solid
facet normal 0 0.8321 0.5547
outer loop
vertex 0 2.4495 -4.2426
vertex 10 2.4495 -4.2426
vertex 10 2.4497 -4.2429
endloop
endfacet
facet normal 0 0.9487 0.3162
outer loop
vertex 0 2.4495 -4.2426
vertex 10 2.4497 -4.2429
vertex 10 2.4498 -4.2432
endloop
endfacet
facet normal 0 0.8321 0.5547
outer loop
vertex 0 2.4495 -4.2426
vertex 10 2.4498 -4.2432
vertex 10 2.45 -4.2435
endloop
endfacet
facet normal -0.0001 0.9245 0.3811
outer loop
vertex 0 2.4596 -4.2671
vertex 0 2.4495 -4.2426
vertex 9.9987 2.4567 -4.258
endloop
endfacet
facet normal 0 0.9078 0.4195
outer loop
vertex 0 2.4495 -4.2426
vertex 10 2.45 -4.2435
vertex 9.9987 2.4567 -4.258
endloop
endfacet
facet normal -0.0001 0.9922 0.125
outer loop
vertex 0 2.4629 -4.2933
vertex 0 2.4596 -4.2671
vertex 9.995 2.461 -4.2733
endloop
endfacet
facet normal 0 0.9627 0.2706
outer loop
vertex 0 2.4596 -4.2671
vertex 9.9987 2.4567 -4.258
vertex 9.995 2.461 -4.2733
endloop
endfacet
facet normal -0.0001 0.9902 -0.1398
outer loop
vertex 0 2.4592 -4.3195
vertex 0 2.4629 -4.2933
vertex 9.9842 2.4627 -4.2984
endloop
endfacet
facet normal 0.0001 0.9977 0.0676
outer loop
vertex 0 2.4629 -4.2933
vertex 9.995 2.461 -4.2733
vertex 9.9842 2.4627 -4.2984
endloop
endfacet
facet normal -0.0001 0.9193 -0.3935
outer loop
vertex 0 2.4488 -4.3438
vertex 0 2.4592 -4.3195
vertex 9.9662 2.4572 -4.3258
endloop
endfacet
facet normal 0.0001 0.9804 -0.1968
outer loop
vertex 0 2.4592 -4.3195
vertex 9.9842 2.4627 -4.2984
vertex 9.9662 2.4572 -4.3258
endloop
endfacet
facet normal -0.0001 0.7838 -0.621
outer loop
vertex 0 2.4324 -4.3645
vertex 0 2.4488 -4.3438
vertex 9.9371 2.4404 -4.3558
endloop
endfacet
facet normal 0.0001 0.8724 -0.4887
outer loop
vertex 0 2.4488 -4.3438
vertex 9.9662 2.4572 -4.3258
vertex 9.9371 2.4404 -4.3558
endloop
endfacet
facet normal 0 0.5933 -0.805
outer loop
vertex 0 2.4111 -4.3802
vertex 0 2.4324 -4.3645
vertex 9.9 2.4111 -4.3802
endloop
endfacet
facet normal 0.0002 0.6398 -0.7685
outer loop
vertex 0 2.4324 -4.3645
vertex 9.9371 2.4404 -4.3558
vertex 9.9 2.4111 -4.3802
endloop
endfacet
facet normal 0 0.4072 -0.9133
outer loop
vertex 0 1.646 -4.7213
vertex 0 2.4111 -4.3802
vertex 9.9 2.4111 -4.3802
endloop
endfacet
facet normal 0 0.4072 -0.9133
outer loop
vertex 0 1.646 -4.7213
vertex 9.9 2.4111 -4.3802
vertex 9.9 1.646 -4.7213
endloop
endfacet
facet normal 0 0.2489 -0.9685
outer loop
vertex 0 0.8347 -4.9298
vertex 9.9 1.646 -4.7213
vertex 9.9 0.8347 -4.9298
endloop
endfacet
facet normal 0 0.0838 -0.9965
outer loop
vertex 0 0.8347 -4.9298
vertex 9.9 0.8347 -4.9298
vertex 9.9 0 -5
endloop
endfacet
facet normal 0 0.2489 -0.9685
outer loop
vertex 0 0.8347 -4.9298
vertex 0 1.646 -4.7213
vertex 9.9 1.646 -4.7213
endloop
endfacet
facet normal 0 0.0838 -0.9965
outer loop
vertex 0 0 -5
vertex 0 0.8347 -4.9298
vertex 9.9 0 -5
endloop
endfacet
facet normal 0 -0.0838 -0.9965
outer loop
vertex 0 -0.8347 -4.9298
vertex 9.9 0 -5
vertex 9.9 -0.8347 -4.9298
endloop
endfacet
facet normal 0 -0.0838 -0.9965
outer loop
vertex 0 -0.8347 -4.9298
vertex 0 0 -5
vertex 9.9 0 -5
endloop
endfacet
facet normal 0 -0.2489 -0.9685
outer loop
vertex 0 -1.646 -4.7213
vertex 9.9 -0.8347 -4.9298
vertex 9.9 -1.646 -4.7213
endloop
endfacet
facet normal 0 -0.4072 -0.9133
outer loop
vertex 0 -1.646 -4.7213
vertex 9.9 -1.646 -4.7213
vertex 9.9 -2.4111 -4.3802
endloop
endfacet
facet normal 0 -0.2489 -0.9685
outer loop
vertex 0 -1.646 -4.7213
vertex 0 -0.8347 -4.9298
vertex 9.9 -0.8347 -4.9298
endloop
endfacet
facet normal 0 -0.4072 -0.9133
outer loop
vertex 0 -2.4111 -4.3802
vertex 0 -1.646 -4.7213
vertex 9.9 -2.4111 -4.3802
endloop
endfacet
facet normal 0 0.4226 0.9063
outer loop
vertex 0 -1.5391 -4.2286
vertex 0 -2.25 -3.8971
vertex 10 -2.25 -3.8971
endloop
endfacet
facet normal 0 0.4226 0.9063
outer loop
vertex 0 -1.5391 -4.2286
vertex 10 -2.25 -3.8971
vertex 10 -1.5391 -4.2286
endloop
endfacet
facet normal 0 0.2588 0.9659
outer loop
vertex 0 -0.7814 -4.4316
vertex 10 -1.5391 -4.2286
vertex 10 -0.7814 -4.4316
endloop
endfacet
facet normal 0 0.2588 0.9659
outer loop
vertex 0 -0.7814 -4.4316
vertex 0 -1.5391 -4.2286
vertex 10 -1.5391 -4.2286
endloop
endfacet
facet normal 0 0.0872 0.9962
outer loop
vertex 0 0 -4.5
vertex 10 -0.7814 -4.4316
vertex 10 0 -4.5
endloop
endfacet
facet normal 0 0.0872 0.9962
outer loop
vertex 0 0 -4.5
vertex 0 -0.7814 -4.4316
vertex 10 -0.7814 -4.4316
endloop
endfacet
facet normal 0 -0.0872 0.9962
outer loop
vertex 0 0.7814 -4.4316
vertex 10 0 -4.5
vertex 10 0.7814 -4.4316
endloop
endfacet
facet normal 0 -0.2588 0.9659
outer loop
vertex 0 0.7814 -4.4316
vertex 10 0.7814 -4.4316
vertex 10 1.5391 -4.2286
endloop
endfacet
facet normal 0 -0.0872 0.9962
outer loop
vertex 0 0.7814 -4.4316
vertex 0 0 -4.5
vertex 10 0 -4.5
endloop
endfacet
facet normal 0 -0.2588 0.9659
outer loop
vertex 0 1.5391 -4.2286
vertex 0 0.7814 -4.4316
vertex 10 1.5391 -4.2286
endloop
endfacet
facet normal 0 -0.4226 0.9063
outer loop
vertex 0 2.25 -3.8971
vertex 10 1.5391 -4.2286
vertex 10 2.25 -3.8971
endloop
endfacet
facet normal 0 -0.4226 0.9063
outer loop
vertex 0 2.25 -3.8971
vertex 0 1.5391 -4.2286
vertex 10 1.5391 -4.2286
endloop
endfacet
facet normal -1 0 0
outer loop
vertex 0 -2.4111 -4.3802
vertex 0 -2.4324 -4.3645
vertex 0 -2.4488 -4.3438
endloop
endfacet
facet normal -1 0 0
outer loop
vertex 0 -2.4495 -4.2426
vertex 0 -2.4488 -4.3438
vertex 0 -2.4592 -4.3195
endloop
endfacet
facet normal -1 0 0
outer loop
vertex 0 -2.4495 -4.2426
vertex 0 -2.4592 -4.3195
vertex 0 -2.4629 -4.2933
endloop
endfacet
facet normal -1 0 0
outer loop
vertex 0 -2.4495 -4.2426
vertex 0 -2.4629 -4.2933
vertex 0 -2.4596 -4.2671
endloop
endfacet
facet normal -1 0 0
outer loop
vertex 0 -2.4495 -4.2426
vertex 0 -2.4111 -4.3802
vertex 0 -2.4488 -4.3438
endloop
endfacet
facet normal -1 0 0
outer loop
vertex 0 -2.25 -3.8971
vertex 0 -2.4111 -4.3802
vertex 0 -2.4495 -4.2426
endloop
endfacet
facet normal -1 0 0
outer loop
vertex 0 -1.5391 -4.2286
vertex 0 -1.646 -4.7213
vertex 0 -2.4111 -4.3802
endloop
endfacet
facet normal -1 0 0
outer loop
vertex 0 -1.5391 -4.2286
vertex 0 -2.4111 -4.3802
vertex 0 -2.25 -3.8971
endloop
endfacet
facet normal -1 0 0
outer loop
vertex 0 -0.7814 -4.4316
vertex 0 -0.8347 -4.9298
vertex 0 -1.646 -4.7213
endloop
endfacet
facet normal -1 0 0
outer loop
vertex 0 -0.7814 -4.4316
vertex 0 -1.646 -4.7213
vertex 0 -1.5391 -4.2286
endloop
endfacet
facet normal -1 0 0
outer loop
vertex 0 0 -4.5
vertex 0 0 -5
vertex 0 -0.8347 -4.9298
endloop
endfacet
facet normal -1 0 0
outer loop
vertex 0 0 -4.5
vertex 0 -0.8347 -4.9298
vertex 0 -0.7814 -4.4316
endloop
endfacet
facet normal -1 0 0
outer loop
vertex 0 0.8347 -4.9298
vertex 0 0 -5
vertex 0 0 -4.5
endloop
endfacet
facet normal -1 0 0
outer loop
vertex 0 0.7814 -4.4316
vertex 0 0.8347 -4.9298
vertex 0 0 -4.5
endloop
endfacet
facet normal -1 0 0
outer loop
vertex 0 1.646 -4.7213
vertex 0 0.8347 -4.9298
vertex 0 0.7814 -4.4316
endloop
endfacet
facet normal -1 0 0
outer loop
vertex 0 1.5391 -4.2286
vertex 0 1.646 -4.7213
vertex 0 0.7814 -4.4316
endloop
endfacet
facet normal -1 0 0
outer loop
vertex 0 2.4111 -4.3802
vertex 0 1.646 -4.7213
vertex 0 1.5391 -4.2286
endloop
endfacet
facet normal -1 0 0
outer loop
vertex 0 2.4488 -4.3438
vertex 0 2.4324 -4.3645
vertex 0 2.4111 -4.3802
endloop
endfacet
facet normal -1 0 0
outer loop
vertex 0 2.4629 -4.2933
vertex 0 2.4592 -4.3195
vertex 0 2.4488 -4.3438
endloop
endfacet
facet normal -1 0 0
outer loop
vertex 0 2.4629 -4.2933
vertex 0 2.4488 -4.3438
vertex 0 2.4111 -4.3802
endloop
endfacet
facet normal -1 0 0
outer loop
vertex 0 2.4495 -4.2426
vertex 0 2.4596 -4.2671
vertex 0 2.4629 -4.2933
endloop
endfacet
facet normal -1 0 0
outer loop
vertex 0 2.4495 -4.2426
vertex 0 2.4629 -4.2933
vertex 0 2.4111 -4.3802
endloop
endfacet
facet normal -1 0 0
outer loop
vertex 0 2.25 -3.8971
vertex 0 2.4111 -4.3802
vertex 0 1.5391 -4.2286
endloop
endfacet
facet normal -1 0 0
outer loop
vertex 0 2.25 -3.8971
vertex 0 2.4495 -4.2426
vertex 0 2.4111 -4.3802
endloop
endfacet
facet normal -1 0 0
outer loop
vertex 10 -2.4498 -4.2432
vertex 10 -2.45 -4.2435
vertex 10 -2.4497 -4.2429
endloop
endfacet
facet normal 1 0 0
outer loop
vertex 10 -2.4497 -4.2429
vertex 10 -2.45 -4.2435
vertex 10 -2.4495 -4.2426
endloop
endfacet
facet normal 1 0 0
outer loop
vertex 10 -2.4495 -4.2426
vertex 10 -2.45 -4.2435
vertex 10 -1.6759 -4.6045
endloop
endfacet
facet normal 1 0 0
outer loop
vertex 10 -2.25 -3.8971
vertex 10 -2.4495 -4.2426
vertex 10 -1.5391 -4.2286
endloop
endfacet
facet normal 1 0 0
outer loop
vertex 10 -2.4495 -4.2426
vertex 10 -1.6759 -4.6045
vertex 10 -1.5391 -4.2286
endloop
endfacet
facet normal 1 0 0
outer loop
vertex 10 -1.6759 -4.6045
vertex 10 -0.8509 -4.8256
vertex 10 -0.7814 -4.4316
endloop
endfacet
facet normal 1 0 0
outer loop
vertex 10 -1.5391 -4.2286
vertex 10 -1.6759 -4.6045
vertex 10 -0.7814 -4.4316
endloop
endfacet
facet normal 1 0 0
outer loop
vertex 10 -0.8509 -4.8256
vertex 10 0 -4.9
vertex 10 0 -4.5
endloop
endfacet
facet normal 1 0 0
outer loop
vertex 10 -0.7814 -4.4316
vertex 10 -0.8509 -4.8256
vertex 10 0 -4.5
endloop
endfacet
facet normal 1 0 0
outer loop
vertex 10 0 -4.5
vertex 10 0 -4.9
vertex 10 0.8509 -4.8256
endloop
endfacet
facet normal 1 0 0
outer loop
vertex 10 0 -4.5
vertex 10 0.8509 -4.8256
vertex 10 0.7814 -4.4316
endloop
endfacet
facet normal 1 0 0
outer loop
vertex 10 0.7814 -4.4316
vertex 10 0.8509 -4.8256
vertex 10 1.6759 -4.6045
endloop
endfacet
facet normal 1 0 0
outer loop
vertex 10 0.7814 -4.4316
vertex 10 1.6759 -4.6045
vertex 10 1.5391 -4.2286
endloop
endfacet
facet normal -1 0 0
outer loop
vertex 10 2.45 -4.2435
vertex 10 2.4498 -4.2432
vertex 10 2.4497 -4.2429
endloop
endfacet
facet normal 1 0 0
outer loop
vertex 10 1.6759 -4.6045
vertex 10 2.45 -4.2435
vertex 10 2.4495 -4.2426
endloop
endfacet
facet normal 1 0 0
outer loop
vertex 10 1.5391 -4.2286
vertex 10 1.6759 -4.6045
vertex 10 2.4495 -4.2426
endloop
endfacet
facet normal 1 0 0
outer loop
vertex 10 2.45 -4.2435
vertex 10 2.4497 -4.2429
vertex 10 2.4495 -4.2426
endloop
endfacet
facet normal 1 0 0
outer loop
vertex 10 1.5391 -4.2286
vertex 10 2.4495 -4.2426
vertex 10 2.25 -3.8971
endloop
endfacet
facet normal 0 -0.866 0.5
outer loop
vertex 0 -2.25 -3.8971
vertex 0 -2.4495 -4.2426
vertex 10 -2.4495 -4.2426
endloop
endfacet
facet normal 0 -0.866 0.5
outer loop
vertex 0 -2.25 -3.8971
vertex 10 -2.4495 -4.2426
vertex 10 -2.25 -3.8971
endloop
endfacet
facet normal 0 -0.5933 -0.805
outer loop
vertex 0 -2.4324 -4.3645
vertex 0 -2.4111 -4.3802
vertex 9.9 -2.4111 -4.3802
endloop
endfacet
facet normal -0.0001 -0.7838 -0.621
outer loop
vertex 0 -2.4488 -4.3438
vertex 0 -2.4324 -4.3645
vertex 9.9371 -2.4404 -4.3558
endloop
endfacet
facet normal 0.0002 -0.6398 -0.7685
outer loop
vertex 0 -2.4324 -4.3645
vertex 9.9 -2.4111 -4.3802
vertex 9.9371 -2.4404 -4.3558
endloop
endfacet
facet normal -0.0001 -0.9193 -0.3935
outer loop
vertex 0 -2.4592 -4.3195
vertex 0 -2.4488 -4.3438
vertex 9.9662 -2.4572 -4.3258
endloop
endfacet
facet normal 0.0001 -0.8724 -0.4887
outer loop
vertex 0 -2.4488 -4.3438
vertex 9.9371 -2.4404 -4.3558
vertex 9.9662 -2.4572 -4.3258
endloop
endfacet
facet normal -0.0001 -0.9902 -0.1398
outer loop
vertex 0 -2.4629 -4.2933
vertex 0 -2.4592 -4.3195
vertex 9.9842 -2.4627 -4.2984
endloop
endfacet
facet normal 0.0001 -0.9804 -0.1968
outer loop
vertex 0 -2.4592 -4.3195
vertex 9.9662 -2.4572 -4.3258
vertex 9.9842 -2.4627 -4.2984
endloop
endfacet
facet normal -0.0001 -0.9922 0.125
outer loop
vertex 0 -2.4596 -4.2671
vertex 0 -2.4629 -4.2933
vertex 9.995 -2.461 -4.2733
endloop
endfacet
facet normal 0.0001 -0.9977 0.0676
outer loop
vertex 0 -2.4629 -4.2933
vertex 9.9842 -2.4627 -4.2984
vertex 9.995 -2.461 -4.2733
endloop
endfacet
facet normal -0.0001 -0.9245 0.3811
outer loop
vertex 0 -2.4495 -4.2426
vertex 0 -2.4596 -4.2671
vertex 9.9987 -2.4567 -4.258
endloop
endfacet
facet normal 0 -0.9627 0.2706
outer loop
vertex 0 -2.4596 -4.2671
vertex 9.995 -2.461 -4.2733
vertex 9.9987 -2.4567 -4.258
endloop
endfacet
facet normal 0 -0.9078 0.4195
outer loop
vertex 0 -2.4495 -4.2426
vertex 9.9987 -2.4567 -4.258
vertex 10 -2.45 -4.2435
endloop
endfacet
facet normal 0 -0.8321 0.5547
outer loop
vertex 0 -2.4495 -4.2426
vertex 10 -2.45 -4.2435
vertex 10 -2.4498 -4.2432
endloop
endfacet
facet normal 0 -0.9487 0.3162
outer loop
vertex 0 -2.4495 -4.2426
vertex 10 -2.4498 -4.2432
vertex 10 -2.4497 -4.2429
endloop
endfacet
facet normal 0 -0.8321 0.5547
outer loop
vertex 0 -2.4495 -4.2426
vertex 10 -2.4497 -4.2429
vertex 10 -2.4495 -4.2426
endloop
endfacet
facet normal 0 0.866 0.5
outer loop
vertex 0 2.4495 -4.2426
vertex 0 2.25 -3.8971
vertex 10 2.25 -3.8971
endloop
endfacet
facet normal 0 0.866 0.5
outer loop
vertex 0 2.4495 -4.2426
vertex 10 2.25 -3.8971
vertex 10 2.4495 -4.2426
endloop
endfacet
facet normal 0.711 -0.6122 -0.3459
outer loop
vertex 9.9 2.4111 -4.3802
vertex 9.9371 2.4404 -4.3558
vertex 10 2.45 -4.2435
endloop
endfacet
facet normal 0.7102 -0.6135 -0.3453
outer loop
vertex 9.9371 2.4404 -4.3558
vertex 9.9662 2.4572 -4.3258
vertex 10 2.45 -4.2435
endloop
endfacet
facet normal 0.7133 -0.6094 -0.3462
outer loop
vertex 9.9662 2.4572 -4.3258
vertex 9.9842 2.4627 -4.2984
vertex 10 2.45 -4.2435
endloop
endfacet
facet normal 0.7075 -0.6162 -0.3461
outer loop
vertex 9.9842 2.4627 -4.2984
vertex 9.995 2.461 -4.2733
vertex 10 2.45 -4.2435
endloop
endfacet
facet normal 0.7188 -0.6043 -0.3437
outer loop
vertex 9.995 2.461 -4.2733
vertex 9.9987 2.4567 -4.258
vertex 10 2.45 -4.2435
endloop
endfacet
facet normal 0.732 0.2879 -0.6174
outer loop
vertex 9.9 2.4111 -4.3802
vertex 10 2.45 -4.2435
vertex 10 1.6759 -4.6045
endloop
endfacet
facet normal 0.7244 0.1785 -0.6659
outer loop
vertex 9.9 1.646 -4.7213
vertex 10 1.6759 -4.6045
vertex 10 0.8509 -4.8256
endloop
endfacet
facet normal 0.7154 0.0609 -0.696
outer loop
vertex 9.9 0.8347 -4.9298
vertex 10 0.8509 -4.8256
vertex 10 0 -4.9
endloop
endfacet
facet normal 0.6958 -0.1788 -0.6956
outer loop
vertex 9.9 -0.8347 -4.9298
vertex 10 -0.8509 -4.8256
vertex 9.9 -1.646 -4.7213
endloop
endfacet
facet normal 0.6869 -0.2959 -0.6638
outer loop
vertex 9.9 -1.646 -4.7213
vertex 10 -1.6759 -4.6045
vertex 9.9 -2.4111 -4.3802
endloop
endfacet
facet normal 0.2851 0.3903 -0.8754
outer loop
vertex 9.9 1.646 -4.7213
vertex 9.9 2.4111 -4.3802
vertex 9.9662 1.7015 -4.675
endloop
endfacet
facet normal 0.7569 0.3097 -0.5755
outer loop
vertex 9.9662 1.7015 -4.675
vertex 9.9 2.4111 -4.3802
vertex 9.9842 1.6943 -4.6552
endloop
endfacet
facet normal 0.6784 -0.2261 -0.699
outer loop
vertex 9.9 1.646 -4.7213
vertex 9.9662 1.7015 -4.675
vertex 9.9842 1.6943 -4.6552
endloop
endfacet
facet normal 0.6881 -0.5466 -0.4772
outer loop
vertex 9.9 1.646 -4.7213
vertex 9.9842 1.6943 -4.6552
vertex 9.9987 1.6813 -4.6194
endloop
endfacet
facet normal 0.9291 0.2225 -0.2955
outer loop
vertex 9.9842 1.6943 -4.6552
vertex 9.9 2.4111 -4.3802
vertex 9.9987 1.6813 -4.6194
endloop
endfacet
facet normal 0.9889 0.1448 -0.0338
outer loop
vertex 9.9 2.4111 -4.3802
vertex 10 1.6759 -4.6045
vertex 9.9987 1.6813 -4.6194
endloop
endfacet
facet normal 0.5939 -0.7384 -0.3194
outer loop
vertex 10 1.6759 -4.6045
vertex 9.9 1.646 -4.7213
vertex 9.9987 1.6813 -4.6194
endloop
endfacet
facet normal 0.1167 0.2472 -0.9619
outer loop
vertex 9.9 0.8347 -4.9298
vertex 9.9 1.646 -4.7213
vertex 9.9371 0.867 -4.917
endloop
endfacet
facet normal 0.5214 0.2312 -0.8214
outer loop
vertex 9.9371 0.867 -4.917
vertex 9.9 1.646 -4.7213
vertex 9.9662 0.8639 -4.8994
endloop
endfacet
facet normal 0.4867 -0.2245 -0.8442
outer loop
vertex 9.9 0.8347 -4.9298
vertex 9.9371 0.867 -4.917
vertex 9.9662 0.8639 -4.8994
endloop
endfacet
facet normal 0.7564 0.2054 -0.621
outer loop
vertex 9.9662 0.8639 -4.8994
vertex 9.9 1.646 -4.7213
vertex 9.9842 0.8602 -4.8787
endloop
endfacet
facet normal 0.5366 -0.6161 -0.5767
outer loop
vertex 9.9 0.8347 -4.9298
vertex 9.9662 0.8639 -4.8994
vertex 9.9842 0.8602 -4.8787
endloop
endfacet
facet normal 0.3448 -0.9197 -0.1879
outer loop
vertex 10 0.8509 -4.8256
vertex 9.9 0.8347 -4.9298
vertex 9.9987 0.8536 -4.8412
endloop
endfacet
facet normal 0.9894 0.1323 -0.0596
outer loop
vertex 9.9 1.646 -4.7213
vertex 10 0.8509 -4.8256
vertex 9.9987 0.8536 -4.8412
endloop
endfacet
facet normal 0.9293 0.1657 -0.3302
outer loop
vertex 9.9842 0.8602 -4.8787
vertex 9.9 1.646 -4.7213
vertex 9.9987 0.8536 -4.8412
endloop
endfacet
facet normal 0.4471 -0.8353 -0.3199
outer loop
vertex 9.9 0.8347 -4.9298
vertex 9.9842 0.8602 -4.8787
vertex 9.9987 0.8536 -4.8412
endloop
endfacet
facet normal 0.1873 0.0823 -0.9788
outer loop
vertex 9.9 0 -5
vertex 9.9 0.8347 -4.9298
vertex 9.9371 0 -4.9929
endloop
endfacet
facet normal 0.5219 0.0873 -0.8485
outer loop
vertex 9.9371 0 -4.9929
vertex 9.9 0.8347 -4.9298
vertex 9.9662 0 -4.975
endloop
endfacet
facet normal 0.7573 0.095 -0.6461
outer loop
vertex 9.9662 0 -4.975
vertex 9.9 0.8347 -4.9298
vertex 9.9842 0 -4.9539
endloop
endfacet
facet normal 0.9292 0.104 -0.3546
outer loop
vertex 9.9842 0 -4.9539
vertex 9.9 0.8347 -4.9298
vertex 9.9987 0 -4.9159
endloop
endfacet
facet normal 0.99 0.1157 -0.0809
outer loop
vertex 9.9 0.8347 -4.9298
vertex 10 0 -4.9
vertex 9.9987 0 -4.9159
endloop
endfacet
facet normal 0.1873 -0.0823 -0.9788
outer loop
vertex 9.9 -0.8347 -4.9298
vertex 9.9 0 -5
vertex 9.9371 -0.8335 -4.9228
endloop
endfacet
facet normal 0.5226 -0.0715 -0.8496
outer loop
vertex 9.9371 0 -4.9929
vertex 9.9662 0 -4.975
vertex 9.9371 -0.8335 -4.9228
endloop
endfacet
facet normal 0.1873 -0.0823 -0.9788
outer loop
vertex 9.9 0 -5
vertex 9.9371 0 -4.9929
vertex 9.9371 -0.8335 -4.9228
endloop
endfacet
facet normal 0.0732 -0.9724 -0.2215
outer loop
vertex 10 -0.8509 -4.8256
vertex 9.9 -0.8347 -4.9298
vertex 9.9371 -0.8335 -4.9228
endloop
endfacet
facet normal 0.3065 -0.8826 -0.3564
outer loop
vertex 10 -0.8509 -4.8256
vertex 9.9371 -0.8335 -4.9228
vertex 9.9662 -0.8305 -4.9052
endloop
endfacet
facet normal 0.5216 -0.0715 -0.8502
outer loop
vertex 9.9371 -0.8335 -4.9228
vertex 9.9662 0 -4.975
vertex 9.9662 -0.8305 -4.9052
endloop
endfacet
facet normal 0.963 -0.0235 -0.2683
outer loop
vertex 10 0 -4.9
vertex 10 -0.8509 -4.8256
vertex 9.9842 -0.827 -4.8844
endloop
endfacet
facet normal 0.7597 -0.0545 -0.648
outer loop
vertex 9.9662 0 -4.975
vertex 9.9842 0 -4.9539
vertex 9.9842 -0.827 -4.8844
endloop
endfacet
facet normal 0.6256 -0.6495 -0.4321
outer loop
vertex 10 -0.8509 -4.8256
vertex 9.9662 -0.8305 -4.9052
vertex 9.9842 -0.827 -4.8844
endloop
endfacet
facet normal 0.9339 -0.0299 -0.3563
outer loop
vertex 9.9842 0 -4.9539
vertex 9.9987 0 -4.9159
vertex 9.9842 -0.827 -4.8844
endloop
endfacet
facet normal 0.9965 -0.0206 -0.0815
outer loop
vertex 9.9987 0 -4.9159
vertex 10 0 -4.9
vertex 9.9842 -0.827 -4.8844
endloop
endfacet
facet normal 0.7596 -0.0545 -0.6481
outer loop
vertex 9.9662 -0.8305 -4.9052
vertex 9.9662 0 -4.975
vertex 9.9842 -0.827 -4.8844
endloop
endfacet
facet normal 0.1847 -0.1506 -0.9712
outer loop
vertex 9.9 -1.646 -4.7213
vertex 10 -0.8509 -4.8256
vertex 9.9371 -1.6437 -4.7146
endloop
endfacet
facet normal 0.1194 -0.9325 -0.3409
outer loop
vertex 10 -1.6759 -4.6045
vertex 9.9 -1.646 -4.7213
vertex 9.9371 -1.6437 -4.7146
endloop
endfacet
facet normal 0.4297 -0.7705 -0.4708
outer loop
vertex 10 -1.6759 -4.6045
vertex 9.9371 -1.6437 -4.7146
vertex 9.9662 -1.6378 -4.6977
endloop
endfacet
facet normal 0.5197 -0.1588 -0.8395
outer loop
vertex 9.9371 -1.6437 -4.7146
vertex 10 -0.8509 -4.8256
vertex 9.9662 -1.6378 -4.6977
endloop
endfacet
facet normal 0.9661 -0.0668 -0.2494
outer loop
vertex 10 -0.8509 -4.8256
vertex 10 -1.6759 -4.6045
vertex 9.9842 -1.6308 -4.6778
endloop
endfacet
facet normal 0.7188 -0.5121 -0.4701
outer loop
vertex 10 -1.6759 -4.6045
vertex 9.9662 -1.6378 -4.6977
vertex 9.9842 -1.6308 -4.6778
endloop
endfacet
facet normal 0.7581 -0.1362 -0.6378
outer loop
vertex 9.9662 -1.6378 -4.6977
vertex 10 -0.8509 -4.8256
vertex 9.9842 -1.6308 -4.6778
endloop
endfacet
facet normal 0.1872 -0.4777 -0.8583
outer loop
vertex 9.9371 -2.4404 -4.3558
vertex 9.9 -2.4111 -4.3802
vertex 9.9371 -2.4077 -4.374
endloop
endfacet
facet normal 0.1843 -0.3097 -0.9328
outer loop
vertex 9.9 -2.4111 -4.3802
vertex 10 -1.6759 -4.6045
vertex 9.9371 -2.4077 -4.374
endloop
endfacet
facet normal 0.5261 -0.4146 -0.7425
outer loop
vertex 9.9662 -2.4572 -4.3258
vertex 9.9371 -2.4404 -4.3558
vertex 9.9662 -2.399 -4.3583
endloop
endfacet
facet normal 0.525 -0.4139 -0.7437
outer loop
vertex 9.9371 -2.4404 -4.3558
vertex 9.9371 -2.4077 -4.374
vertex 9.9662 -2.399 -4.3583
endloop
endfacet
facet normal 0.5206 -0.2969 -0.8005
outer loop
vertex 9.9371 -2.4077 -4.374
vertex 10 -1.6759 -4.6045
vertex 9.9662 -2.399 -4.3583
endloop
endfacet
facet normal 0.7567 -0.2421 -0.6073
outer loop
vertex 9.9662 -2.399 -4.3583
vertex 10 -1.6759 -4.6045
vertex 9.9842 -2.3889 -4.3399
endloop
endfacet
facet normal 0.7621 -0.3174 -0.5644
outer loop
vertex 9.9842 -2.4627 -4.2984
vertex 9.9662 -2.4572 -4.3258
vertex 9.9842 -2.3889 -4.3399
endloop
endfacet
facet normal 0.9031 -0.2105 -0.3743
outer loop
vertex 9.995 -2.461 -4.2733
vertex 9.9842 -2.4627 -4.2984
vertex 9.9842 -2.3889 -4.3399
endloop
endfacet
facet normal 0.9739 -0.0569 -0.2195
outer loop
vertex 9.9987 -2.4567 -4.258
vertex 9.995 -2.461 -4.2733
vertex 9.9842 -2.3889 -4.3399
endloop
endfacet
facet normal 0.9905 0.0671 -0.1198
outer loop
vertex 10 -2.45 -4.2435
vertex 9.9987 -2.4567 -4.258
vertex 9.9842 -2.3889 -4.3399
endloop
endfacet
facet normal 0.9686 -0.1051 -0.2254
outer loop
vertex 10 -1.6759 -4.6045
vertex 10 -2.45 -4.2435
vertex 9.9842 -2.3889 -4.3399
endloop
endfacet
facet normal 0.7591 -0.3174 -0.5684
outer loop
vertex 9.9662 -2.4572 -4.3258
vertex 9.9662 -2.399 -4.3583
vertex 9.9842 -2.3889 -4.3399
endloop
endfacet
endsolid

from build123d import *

# Parameters (mm, degrees)
BOSS_EXTRUDE1_DEPTH = 10
FILLET3_R           = 0.1


with BuildPart() as part:
    # airflap → Boss-Extrude1 (new body)
    with BuildSketch(Plane(origin=(0, 0, 0), x_dir=(0, 0, -1), z_dir=(1, 0, 0))):
        with BuildLine():
            Line((3.897114317, 2.25), (4.330127019, 2.5))
            ThreePointArc((4.330127019, 2.5), (5, 0), (4.330127019, -2.5))
            Line((4.330127019, -2.5), (3.897114317, -2.25))
            ThreePointArc((3.897114317, -2.25), (4.5, 0), (3.897114317, 2.25))
        make_face()
    extrude(amount=BOSS_EXTRUDE1_DEPTH)

    # Fillet3
    fillet3_edges = [part.edges().sort_by_distance(p)[0] for p in [
        (10, 0, -5),
        (5, 2.5, -4.330127019),
        (5, -2.5, -4.330127019),
    ]]
    fillet(fillet3_edges, radius=FILLET3_R)


solid = part.part
